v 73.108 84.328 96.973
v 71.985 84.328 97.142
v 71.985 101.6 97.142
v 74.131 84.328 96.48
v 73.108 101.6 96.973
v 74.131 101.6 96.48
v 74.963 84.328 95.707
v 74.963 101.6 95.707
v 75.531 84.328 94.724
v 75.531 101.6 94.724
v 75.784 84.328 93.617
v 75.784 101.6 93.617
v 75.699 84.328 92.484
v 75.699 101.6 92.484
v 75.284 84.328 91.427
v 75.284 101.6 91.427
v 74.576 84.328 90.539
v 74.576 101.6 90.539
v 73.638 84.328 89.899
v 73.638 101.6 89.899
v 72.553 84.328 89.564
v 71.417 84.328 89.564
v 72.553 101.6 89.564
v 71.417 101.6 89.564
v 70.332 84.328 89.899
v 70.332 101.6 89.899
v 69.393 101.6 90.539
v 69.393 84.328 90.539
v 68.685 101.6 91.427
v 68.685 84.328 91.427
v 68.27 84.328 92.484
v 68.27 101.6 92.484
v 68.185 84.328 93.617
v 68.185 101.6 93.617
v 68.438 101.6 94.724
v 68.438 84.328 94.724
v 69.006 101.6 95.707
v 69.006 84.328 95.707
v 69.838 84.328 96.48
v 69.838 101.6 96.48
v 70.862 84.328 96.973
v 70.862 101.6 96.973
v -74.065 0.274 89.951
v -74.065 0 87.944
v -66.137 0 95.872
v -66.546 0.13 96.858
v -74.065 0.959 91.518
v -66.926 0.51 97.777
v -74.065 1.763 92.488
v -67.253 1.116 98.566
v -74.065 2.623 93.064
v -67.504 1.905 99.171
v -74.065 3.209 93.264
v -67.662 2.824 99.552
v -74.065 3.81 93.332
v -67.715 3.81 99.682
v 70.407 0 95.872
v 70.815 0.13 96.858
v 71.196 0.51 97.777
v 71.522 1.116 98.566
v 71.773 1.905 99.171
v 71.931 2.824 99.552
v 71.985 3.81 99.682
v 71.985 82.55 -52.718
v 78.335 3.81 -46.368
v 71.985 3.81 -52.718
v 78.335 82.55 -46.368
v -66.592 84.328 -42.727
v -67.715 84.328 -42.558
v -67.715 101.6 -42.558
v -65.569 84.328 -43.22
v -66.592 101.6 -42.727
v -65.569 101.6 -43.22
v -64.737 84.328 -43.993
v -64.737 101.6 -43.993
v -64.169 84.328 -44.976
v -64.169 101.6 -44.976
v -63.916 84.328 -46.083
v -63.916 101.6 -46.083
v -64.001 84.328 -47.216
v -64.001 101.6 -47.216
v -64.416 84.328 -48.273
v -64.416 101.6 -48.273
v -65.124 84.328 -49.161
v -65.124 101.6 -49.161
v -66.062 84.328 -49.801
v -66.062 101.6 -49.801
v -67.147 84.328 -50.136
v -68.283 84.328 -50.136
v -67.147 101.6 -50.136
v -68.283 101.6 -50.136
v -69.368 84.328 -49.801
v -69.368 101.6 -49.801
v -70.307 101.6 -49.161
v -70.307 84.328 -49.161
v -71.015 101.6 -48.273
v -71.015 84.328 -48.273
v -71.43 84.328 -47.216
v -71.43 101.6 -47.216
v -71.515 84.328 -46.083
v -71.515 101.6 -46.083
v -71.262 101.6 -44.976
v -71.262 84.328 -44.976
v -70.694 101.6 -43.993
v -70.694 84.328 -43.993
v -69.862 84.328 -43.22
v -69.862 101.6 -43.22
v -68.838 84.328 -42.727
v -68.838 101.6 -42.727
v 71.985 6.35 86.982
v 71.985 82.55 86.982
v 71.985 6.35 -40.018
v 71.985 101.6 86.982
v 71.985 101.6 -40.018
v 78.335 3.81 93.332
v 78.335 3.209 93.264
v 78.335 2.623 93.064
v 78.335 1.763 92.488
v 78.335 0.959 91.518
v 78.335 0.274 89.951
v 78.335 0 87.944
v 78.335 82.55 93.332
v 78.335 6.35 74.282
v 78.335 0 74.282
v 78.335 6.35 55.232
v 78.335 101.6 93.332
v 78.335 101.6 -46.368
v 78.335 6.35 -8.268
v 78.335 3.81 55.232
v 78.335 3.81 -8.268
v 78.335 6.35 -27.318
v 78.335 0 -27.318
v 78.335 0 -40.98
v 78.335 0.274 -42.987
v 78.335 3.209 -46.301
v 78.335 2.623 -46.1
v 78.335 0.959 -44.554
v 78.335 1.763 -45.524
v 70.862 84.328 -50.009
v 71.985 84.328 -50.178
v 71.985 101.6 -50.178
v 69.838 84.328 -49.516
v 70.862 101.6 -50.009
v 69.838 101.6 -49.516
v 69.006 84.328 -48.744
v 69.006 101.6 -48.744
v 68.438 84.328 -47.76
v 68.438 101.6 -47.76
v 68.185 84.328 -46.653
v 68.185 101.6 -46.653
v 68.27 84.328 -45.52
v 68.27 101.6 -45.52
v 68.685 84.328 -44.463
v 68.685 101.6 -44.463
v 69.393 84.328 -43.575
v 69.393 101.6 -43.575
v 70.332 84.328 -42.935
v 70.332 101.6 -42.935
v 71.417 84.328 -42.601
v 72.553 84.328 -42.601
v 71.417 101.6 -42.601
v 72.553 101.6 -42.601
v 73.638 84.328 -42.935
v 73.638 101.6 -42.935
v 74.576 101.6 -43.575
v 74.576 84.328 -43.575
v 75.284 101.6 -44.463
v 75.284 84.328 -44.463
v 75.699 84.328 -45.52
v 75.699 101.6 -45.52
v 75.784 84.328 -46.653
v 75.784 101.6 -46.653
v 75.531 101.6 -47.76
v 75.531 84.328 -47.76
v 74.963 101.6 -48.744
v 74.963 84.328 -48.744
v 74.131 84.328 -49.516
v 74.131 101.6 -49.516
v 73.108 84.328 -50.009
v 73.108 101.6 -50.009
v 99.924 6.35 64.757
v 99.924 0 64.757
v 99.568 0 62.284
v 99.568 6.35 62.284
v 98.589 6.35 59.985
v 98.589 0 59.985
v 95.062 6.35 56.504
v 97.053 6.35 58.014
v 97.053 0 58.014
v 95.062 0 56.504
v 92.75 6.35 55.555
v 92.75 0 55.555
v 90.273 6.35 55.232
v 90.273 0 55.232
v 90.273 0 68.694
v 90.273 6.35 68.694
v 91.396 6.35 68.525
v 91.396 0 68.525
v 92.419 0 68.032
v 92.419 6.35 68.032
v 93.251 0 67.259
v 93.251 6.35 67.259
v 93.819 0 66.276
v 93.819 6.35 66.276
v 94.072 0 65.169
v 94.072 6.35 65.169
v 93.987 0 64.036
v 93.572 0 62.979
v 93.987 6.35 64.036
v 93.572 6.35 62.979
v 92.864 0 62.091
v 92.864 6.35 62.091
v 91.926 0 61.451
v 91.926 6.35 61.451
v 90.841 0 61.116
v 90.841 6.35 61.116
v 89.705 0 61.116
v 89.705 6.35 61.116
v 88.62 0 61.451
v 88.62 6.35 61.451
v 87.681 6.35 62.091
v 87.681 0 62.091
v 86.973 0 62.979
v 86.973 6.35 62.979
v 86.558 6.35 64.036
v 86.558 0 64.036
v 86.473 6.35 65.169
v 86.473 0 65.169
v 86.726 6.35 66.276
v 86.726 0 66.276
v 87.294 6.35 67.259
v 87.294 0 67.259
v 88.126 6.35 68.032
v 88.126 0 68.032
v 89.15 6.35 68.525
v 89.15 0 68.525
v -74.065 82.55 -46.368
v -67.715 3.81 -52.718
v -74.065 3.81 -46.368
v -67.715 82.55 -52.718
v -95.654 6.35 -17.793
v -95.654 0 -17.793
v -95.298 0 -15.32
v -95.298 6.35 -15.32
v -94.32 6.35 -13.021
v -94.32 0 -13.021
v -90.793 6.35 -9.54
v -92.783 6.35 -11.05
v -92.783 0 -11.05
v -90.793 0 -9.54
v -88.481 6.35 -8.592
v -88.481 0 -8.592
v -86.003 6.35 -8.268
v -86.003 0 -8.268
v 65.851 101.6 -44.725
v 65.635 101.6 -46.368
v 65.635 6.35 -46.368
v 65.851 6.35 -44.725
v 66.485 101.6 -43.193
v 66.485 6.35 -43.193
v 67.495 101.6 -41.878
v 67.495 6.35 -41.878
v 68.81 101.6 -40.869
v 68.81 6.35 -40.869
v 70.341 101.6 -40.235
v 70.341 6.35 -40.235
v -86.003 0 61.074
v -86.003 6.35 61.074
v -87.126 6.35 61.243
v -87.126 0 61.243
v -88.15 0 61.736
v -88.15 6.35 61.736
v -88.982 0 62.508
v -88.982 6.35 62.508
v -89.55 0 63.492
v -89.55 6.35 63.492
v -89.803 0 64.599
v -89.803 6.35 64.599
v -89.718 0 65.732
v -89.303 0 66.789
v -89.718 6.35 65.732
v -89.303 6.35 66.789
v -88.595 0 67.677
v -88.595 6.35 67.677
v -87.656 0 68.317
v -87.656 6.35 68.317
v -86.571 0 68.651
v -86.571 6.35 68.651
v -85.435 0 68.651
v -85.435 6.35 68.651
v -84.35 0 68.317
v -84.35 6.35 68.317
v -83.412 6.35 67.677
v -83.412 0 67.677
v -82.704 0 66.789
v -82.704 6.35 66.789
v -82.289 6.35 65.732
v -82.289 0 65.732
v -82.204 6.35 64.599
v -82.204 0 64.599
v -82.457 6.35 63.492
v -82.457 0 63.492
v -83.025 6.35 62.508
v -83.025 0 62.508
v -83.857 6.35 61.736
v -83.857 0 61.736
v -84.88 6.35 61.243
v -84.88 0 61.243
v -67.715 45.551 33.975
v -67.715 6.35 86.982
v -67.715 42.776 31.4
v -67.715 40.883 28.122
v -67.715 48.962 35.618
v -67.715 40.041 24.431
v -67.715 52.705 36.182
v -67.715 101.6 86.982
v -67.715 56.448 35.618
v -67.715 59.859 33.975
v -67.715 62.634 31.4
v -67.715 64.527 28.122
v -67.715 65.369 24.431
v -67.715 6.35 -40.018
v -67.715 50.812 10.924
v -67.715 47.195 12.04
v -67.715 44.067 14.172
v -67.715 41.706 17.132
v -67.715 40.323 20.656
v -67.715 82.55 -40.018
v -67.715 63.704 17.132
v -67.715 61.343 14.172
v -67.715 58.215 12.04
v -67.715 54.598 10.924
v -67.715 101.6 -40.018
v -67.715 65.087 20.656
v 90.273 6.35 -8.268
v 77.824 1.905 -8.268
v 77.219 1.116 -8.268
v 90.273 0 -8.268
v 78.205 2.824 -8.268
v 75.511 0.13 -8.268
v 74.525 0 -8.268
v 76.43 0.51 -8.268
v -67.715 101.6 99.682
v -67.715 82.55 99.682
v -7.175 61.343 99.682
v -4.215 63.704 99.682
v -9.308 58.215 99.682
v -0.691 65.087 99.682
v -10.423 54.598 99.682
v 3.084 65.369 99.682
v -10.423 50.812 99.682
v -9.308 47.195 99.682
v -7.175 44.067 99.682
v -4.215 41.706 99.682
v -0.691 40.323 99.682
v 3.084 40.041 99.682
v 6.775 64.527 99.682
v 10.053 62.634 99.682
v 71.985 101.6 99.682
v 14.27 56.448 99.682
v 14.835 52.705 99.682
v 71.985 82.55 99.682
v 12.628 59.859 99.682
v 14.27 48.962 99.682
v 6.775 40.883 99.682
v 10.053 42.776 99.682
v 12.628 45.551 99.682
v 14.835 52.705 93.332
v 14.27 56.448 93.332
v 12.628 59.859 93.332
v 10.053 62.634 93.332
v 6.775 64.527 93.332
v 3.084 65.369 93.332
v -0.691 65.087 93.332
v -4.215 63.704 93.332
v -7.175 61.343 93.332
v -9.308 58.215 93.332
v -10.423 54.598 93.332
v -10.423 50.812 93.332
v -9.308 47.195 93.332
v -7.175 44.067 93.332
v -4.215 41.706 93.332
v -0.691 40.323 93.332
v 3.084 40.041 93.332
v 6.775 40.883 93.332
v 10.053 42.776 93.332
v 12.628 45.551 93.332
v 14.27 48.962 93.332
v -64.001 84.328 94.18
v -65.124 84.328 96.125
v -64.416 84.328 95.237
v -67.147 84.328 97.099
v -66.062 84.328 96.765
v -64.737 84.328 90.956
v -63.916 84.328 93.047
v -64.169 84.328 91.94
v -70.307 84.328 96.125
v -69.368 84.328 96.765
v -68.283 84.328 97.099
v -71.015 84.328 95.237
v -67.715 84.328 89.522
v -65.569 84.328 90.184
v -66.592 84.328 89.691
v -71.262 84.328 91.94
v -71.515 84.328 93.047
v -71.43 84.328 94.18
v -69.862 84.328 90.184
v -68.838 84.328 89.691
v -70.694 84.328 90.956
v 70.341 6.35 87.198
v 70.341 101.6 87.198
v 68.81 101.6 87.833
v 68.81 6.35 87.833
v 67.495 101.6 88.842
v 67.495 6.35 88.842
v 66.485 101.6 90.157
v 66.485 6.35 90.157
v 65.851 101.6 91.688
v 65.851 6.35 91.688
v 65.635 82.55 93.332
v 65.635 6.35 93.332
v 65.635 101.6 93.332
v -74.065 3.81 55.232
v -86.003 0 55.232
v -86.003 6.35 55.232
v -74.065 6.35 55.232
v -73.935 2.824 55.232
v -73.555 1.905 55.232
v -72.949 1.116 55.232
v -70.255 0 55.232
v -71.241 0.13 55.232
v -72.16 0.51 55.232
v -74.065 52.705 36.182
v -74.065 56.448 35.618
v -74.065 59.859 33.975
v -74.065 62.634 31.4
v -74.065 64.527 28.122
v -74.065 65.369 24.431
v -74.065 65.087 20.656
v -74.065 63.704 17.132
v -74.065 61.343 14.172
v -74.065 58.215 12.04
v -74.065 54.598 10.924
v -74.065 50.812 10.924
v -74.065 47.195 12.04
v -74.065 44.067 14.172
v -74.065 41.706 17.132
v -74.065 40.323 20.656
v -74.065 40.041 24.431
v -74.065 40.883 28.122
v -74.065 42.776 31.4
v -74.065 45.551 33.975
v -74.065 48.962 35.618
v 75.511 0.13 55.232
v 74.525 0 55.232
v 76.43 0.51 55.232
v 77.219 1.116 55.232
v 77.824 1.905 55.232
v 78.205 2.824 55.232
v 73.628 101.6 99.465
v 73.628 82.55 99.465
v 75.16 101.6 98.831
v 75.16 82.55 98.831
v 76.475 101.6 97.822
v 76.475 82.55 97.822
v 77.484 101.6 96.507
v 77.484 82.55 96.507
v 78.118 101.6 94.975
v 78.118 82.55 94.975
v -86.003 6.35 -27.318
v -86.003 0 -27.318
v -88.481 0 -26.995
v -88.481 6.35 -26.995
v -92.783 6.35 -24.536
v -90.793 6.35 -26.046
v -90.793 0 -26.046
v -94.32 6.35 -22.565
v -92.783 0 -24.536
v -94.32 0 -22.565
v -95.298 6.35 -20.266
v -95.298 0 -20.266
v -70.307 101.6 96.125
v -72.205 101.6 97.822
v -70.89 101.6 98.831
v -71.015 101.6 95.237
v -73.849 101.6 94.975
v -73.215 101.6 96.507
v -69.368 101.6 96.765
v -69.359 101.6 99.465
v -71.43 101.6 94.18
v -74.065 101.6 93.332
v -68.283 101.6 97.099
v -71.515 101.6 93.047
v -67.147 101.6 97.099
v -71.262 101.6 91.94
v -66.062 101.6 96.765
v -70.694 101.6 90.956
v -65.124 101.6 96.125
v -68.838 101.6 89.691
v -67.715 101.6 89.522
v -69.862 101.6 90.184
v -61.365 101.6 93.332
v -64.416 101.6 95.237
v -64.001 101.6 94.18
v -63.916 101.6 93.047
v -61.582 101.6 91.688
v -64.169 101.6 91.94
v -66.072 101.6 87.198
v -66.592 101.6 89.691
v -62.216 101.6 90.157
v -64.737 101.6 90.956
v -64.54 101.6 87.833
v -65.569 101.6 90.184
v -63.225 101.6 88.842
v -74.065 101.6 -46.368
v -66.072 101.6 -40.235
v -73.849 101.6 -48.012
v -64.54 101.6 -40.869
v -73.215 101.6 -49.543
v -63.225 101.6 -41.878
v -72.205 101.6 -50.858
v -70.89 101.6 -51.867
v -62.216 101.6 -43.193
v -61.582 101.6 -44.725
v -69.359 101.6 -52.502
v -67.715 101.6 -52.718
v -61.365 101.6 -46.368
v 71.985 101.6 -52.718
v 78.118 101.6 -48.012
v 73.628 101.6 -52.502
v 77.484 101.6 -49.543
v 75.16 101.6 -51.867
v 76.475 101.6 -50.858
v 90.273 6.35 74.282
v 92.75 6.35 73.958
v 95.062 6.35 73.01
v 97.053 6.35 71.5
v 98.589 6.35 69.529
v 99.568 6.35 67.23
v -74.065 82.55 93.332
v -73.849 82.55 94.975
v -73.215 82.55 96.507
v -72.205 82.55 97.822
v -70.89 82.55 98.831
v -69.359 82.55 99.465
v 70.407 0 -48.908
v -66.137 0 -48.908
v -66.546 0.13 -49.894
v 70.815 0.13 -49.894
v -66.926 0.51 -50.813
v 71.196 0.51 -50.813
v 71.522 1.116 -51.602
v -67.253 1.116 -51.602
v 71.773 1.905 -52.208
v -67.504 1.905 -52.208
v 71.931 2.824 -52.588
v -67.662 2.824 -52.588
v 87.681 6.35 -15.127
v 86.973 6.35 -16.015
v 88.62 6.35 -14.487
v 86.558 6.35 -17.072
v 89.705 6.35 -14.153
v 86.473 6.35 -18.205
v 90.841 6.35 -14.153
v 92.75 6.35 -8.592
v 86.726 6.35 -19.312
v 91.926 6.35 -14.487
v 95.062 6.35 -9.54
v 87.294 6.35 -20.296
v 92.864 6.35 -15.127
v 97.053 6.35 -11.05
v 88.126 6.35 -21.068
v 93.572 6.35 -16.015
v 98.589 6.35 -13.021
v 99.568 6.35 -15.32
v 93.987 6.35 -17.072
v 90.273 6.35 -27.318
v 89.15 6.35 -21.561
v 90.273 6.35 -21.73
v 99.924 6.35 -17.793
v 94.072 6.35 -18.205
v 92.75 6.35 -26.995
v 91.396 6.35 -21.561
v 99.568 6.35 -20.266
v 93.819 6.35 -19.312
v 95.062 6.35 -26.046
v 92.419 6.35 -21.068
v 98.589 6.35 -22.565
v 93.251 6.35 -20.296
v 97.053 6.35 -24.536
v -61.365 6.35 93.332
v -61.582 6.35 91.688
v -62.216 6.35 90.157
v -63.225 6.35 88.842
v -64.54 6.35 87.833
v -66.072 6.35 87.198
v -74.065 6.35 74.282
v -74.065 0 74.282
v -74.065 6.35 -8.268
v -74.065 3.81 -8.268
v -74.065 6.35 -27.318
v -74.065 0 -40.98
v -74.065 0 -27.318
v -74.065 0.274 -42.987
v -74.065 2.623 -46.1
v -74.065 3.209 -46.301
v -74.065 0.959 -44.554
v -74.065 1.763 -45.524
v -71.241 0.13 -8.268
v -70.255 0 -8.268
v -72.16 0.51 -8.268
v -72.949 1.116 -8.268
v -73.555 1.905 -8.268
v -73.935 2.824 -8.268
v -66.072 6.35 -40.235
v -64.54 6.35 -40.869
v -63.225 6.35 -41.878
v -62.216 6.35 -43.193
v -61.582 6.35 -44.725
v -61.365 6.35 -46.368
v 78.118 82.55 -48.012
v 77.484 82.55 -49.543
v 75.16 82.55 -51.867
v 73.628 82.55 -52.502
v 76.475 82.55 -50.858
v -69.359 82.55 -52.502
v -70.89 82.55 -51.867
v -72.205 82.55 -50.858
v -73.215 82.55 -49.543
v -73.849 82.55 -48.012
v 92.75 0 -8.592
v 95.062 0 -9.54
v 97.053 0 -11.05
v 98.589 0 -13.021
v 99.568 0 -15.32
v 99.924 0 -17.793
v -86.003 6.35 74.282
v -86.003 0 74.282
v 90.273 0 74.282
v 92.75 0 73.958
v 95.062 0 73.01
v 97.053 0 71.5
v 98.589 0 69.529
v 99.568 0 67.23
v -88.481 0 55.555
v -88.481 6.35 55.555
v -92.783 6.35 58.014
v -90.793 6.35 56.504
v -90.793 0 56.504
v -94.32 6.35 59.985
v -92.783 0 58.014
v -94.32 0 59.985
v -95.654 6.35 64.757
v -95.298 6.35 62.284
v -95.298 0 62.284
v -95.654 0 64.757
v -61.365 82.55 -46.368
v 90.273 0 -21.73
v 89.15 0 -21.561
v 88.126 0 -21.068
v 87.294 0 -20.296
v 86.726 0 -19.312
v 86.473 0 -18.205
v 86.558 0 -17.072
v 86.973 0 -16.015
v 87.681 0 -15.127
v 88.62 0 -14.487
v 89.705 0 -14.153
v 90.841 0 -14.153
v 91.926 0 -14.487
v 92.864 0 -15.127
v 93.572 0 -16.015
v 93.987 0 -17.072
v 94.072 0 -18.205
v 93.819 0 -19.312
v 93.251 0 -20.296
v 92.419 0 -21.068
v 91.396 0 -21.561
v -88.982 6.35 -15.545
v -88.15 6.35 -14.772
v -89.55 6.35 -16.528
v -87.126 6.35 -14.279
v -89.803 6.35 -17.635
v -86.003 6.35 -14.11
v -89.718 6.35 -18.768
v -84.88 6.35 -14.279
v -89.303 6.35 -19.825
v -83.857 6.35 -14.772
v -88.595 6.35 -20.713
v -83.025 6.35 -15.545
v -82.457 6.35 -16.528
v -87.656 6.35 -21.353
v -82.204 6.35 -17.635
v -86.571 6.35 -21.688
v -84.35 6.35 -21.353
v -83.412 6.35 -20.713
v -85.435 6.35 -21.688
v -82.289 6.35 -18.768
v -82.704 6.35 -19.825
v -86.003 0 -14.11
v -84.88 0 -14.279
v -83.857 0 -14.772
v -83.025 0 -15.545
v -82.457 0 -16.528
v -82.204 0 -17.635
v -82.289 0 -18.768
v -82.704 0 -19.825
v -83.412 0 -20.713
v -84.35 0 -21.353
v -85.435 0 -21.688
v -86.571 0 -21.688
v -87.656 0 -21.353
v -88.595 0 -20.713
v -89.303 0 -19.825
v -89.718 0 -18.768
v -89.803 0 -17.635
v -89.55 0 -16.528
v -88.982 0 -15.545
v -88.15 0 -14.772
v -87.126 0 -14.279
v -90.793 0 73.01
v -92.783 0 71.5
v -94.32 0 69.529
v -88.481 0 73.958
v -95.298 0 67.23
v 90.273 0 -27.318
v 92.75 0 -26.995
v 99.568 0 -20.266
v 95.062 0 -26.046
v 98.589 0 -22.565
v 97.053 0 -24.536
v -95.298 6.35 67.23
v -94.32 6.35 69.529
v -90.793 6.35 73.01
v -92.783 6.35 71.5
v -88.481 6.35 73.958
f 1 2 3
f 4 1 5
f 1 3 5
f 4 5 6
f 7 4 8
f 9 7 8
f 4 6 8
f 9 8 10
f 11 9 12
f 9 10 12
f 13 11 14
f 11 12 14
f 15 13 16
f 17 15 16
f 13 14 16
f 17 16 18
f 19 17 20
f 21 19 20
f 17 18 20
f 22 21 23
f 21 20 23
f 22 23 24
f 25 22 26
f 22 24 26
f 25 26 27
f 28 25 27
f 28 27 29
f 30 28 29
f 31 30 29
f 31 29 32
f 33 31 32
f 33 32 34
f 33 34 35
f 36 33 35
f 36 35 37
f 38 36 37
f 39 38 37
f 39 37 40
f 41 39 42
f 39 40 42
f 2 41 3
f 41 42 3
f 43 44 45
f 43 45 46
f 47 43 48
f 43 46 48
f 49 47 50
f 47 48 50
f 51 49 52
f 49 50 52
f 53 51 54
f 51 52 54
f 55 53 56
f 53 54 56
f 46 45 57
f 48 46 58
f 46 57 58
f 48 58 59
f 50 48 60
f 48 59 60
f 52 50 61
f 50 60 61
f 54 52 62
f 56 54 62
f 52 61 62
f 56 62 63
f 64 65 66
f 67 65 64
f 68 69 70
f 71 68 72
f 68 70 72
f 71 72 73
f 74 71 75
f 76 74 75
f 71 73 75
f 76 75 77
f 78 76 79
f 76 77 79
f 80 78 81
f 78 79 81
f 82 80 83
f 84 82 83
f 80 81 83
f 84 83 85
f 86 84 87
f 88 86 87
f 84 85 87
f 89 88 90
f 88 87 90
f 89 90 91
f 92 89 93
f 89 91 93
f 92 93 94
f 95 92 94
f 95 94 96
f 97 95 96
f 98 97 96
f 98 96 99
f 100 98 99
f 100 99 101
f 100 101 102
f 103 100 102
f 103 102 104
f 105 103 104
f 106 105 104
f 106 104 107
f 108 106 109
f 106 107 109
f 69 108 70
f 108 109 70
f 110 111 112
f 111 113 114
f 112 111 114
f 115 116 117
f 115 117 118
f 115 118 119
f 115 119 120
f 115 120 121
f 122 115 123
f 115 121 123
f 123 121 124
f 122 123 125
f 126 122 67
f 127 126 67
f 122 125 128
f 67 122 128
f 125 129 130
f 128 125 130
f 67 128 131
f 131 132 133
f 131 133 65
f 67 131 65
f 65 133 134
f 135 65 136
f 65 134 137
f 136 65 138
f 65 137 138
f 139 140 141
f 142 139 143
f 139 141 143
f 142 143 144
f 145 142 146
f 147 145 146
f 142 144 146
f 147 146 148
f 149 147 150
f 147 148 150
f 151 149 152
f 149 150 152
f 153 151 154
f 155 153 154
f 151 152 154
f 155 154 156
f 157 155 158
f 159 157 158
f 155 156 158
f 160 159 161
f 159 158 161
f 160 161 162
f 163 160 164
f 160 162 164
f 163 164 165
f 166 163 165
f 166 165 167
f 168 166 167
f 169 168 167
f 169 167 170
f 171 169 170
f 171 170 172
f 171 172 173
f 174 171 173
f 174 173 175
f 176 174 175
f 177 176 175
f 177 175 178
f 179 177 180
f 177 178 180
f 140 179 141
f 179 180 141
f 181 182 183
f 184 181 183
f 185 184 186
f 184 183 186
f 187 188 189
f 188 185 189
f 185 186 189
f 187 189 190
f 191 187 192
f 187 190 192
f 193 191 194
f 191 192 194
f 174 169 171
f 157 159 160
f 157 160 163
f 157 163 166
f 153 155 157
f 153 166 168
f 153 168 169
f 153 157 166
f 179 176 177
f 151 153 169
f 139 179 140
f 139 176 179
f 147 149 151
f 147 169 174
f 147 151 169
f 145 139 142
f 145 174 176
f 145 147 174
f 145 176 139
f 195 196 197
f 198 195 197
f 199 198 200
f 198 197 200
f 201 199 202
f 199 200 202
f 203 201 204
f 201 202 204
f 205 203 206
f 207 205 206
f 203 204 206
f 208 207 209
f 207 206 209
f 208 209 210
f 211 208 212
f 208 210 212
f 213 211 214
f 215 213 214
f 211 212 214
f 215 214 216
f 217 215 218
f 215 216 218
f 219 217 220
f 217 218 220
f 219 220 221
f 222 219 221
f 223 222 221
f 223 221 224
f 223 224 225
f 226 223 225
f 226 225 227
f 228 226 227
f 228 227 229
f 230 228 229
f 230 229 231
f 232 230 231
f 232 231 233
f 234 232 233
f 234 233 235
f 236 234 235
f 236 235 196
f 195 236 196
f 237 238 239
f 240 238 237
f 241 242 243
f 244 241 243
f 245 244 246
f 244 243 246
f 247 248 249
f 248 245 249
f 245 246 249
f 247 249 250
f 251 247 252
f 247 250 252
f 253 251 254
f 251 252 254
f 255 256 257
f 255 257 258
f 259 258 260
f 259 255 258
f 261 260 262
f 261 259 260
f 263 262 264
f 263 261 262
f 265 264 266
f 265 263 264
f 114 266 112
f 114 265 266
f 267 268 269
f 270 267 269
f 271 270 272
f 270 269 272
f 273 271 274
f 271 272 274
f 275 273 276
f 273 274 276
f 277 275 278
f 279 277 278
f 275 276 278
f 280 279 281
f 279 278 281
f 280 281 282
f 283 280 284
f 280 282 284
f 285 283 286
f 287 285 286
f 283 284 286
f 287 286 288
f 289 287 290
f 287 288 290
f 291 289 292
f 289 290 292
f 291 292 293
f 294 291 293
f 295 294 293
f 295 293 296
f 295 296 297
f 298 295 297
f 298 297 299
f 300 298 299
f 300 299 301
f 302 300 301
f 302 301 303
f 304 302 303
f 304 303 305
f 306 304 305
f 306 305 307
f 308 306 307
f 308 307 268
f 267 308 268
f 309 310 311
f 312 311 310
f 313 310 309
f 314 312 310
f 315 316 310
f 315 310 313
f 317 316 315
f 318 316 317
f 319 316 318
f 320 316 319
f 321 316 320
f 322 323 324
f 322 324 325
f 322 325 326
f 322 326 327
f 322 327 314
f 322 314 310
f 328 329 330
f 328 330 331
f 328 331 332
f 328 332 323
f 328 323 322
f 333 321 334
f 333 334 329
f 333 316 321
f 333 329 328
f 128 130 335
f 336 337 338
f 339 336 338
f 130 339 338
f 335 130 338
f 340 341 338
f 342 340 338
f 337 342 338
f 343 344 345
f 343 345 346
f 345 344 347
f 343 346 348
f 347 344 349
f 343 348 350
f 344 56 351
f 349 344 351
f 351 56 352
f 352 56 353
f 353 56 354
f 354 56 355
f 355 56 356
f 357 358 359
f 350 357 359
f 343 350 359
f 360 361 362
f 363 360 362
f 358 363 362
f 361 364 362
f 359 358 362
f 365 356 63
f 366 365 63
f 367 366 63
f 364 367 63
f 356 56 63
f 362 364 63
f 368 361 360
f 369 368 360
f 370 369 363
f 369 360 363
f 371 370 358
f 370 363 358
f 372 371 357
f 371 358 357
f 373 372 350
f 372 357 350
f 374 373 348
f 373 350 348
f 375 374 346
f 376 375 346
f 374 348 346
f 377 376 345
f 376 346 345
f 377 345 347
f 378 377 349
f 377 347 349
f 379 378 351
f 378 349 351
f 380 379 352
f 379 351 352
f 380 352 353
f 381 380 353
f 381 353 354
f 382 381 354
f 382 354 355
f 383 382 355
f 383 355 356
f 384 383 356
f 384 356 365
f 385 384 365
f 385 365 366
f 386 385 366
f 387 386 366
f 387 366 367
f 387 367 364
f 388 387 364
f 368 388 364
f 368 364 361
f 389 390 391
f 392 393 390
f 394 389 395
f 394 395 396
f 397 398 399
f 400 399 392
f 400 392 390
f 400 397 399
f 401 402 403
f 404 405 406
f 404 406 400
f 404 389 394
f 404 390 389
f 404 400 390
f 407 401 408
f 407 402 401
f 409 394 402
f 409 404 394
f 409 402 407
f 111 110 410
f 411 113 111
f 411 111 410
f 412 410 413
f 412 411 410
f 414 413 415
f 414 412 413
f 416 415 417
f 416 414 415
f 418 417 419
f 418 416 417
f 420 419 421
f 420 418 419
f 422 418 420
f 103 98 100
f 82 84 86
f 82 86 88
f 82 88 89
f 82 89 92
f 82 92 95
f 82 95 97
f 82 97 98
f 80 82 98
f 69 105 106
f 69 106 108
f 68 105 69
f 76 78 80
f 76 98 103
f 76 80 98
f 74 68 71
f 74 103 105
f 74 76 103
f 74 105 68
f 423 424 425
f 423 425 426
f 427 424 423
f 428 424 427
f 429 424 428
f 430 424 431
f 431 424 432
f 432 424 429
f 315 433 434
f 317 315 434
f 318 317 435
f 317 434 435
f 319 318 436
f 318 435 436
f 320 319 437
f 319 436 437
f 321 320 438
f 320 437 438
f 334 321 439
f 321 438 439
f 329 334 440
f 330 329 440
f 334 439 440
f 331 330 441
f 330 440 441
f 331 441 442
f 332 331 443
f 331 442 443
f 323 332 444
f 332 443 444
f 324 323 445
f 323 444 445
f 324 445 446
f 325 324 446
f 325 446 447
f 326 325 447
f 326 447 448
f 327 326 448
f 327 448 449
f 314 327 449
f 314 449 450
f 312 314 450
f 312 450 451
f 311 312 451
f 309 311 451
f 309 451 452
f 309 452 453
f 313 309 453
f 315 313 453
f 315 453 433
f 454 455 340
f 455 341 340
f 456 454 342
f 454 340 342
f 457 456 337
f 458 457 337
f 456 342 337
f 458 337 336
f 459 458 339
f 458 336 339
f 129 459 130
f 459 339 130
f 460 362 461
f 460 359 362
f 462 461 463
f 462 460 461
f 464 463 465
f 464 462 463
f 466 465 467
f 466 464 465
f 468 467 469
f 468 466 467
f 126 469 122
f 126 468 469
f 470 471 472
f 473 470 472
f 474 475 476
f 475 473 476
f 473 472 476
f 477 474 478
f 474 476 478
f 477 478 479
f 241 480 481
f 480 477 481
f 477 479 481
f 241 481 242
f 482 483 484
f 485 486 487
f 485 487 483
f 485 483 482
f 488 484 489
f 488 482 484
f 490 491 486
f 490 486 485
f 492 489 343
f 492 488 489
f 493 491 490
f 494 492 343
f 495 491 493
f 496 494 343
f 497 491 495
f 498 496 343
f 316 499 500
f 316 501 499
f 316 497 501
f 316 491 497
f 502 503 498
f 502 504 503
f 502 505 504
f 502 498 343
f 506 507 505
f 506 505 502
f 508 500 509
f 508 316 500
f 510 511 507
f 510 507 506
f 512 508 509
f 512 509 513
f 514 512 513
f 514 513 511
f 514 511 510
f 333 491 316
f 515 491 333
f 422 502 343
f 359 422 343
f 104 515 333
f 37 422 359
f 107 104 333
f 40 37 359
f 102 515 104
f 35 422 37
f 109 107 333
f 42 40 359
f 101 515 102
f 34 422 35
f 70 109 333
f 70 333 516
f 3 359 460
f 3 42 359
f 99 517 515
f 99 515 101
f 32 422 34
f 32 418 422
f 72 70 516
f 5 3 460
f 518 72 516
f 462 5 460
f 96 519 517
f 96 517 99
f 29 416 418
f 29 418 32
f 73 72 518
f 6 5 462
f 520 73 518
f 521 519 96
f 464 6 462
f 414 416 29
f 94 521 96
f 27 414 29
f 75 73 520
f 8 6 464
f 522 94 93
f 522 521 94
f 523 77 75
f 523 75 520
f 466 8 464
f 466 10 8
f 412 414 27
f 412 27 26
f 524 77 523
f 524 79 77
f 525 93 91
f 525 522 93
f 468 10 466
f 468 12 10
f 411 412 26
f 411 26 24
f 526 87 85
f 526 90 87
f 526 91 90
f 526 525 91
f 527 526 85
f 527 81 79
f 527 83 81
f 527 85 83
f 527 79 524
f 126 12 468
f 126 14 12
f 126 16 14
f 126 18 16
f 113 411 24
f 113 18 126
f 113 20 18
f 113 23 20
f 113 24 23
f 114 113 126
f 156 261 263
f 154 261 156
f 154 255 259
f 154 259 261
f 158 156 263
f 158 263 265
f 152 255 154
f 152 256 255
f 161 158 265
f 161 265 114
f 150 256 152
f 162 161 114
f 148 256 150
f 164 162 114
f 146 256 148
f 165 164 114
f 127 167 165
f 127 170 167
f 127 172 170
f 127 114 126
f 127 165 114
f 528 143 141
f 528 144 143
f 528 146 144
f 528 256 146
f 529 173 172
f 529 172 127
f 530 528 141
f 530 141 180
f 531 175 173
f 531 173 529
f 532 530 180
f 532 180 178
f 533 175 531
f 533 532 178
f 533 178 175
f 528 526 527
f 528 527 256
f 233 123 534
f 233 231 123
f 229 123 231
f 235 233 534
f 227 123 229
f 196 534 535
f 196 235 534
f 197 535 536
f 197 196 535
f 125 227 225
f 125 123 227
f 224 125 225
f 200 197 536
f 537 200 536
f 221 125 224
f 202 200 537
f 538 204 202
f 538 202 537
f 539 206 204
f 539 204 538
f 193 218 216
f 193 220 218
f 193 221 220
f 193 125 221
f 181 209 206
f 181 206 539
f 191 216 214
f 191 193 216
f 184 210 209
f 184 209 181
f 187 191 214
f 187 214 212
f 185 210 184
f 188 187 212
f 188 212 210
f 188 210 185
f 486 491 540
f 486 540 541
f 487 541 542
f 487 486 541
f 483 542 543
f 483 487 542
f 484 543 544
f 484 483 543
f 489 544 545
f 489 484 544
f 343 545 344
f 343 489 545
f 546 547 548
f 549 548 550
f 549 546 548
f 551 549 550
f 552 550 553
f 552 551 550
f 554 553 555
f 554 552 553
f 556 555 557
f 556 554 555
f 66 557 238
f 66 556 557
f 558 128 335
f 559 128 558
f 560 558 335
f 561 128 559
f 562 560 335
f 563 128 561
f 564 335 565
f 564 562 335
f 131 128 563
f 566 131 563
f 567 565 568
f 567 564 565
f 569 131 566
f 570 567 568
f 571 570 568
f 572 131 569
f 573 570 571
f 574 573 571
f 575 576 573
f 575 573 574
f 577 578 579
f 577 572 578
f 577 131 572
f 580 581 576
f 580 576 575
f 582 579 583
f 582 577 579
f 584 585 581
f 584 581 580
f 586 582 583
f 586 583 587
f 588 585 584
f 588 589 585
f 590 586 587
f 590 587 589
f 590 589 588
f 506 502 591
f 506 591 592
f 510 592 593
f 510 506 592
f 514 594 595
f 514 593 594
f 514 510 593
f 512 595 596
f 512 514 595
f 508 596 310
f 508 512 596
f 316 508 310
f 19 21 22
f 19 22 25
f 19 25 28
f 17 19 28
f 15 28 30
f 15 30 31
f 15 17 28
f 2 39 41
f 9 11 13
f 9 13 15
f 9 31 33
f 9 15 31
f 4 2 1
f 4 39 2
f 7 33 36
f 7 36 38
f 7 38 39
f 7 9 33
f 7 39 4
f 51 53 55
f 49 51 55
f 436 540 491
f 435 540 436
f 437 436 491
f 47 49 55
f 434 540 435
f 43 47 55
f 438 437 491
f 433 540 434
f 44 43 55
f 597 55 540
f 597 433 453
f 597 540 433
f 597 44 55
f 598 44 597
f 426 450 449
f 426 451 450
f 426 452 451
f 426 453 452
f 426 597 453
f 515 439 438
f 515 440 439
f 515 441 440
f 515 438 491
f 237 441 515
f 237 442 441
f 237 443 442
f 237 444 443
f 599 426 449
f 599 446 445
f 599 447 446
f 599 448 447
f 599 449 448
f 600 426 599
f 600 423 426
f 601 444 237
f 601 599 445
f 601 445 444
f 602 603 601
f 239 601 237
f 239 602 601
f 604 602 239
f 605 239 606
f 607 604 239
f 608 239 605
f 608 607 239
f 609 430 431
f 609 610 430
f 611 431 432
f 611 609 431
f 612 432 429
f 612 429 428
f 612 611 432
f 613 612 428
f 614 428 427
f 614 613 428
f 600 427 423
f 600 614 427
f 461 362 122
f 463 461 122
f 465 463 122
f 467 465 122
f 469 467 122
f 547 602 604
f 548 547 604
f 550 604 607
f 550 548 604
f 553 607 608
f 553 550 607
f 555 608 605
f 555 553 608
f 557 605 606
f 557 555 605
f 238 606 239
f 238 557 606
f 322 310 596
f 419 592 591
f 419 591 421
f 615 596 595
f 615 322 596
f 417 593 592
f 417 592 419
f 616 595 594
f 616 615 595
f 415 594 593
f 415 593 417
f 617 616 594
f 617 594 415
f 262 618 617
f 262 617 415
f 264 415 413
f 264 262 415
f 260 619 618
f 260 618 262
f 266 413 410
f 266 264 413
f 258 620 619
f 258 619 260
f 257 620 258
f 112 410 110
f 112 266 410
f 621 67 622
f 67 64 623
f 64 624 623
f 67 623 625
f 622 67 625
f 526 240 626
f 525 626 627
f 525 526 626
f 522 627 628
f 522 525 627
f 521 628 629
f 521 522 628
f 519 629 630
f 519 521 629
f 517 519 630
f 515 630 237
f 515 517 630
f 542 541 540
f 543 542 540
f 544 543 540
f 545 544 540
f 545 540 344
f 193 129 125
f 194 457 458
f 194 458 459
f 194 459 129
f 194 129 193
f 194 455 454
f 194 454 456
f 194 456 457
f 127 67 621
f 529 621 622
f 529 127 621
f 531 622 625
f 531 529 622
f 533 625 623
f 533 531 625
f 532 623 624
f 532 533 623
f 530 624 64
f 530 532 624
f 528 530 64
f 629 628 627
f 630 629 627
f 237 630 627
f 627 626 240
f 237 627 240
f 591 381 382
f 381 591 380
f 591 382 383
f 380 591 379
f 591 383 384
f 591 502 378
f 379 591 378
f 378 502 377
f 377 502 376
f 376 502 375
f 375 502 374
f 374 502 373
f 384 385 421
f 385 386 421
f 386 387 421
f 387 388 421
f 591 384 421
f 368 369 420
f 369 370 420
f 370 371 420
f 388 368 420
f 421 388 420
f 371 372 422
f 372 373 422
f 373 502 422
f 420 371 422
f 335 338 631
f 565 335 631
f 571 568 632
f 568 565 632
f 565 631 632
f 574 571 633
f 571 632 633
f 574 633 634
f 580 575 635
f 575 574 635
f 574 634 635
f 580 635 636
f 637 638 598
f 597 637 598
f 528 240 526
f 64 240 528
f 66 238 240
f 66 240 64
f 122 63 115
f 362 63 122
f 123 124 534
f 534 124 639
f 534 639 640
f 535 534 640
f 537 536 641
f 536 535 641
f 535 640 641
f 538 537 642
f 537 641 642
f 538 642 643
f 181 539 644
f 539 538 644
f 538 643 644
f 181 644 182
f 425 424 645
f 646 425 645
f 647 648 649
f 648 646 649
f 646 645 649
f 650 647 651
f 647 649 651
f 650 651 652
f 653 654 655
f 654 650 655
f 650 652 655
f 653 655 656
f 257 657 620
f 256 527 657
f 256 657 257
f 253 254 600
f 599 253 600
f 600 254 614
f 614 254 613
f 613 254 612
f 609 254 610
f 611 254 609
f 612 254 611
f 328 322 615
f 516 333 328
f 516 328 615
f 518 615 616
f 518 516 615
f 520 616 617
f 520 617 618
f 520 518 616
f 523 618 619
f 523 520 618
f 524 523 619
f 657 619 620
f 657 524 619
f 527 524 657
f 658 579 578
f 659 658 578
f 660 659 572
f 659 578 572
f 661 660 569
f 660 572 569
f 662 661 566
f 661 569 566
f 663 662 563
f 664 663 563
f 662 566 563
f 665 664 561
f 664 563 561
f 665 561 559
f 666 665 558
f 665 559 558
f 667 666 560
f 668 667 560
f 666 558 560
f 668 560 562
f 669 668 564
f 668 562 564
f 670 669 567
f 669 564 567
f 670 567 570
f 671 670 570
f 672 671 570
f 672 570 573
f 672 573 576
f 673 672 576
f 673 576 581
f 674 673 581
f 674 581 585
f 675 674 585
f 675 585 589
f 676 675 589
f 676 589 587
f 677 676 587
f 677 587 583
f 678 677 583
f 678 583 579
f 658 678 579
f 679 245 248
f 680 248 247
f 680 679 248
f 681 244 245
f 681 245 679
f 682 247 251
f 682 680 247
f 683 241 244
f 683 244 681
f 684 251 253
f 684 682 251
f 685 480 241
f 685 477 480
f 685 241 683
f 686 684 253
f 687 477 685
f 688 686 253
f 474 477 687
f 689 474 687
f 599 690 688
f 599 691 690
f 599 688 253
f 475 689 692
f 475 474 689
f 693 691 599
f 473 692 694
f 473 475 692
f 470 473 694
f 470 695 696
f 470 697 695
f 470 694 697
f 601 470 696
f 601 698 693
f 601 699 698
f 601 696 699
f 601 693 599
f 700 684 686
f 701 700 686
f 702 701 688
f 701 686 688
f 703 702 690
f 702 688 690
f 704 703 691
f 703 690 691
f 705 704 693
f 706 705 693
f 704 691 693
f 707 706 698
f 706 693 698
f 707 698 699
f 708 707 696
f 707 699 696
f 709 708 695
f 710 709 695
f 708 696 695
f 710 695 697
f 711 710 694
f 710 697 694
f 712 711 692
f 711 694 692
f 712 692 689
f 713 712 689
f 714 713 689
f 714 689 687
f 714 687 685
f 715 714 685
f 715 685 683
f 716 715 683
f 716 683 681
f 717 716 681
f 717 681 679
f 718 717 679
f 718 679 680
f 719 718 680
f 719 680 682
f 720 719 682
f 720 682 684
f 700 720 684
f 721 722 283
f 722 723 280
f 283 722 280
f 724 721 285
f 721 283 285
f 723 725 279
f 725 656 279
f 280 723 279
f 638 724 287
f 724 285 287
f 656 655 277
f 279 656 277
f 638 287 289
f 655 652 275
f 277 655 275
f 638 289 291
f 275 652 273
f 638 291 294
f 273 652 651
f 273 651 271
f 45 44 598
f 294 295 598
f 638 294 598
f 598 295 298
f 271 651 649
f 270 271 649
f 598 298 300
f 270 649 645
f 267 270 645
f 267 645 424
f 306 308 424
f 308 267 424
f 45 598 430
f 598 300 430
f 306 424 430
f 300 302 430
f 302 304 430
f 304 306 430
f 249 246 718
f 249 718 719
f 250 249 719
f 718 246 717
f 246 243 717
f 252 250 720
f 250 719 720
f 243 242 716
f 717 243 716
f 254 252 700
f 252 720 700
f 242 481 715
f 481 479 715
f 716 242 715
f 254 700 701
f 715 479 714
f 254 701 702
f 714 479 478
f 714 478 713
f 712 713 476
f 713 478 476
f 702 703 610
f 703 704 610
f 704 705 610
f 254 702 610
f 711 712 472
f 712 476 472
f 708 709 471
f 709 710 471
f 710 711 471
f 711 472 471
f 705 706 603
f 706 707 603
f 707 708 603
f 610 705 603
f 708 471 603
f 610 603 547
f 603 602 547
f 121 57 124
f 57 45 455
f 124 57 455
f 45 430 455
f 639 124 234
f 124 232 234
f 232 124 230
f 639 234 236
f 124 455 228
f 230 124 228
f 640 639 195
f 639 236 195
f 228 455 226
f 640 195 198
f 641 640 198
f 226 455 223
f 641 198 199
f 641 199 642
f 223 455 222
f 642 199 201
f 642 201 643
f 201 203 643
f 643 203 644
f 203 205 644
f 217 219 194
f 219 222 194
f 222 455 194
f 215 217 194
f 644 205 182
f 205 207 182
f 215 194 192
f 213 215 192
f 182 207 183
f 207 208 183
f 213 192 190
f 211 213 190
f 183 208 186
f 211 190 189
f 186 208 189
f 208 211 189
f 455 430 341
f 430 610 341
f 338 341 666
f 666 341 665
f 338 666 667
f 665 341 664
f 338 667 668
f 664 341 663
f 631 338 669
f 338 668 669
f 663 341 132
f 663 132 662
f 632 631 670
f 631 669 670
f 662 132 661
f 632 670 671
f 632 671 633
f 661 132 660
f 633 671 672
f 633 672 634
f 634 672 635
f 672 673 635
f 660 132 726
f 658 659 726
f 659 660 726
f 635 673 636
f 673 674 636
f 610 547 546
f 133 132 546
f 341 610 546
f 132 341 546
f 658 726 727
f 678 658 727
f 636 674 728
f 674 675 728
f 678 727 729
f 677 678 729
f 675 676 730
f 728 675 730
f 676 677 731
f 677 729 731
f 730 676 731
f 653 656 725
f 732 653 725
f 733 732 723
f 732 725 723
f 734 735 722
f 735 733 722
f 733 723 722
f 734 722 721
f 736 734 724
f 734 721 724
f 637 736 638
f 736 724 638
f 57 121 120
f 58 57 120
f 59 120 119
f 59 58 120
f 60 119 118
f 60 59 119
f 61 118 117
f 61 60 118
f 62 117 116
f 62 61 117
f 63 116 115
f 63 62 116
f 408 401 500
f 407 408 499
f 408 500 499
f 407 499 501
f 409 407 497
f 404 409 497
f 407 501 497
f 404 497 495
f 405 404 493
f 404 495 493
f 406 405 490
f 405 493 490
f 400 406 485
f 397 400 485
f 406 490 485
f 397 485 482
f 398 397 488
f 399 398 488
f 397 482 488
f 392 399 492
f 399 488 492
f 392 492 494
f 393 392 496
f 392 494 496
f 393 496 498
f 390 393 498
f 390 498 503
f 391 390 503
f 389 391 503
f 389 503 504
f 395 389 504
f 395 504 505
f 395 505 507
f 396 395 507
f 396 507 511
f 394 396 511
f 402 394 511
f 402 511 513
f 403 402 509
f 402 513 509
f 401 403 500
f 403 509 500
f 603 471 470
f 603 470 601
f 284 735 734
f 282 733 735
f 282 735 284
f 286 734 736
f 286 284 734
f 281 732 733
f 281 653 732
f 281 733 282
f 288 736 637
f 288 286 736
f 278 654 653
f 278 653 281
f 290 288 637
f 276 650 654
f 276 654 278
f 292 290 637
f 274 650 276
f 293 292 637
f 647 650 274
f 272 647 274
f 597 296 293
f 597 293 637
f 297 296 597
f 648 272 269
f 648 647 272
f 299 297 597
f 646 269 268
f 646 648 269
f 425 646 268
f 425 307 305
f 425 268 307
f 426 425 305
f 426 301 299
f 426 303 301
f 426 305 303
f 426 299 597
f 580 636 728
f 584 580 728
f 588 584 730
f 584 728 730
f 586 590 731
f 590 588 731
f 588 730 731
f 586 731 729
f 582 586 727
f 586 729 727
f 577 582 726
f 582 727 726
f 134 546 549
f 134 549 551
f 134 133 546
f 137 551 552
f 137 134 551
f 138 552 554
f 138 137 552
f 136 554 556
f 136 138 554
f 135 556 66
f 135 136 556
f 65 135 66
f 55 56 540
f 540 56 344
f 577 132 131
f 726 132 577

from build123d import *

# Parameters (mm, degrees)
SKETCH1_W           = 152.4
SKETCH1_H           = 152.4
BOSS_EXTRUDE1_DEPTH = 101.6
SKETCH2_W           = 25.4
SKETCH2_H           = 19.05
BOSS_EXTRUDE2_DEPTH = 6.35
SKETCH3_W           = 139.7
SKETCH3_H           = 139.7
CUT_EXTRUDE1_DEPTH  = 95.25
FILLET1_R           = 9.652
CHAMFER1_SIZE       = 6.35
SKETCH4_R           = 3.81
CUT_EXTRUDE2_DEPTH  = 171.275704178
FILLET2_R           = 3.81
SKETCH5_R           = 6.35
BOSS_EXTRUDE3_DEPTH = 19.05
BOSS_EXTRUDE4_DEPTH = 95.25
SKETCH6_R           = 3.81
CUT_EXTRUDE3_DEPTH  = 17.272
CUT_EXTRUDE4_REACH  = 210.646
SKETCH8_R           = 12.7
CUT_EXTRUDE5_REACH  = 226.792
SKETCH9_R           = 12.7


with BuildPart() as part:
    # Sketch1 → Boss-Extrude1 (new body)
    with BuildSketch(Plane(origin=(0, 0, 0), x_dir=(1, 0, 0), z_dir=(0, 1, 0))):
        with Locations((2.134713764, -23.481851401)):
            Rectangle(SKETCH1_W, SKETCH1_H)
    extrude(amount=BOSS_EXTRUDE1_DEPTH)

    # Sketch2 → Boss-Extrude2 (add)
    with BuildSketch(Plane(origin=(0, 0, 0), x_dir=(1, 0, 0), z_dir=(0, 1, 0))):
        with Locations((87.224713764, -64.756851401)):
            Rectangle(SKETCH2_W, SKETCH2_H)
        with Locations((-82.955286236, -64.756851401)):
            Rectangle(SKETCH2_W, SKETCH2_H)
        with Locations((87.224713764, 17.793148599)):
            Rectangle(SKETCH2_W, SKETCH2_H)
        with Locations((-82.955286236, 17.793148599)):
            Rectangle(SKETCH2_W, SKETCH2_H)
    extrude(amount=BOSS_EXTRUDE2_DEPTH)

    # Sketch3 → Cut-Extrude1 (cut)
    with BuildSketch(Plane(origin=(0, 101.6, 0), x_dir=(1, 0, 0), z_dir=(0, 1, 0))):
        with Locations((2.134713764, -23.481851401)):
            Rectangle(SKETCH3_W, SKETCH3_H)
    extrude(amount=-CUT_EXTRUDE1_DEPTH, mode=Mode.SUBTRACT)

    # Fillet1
    # the kernel refuses this fillet: 9.652 mm, written as the material it takes off along each edge
    with BuildSketch(Plane(origin=(-95.655286236, -24.13, -27.318148599), x_dir=(1, 0, 0), z_dir=(0, 1, 0)), Plane(origin=(-95.655286236, -24.13, 55.231851401), x_dir=(1, 0, 0), z_dir=(0, 1, 0)), Plane(origin=(99.924713764, -24.13, -8.268148599), x_dir=(-1, 0, 0), z_dir=(0, 1, 0)), Plane(origin=(99.924713764, -24.13, 74.281851401), x_dir=(-1, 0, 0), z_dir=(0, 1, 0))) as fillet1_piece_1:
        with BuildLine():
            CenterArc((FILLET1_R, -FILLET1_R), FILLET1_R, 90, 90)
            Line((0, -FILLET1_R), (0, 0))
            Line((0, 0), (FILLET1_R, 0))
        make_face()
    extrude(amount=54.61, mode=Mode.SUBTRACT)
    with BuildSketch(Plane(origin=(-95.655286236, -24.13, -8.268148599), x_dir=(1, 0, 0), z_dir=(0, 1, 0)), Plane(origin=(-95.655286236, -24.13, 74.281851401), x_dir=(1, 0, 0), z_dir=(0, 1, 0)), Plane(origin=(99.924713764, -24.13, -27.318148599), x_dir=(-1, 0, 0), z_dir=(0, 1, 0)), Plane(origin=(99.924713764, -24.13, 55.231851401), x_dir=(-1, 0, 0), z_dir=(0, 1, 0))) as fillet1_piece_2:
        with BuildLine():
            CenterArc((FILLET1_R, FILLET1_R), FILLET1_R, 180, 90)
            Line((0, FILLET1_R), (0, 0))
            Line((0, 0), (FILLET1_R, 0))
        make_face()
    extrude(amount=54.61, mode=Mode.SUBTRACT)

    # Chamfer1
    chamfer1_edges = [part.edges().sort_by_distance(p)[0] for p in [
        (-74.065286236, 50.8, -52.718148599),
        (78.334713764, 50.8, -52.718148599),
        (78.334713764, 50.8, 99.681851401),
        (-74.065286236, 50.8, 99.681851401),
    ]]
    chamfer(chamfer1_edges, length=CHAMFER1_SIZE)

    # Sketch4 → Cut-Extrude2 (cut, through all)
    with BuildSketch(Plane(origin=(0, 6.35, 0), x_dir=(1, 0, 0), z_dir=(0, 1, 0))):
        with Locations(Location((90.272713764, -64.883851401, 0), (0, 0, 270))):
            Circle(SKETCH4_R)
        with Locations(Location((-86.003286236, -64.883851401, 0), (0, 0, 90))):
            Circle(SKETCH4_R)
        with Locations(Location((90.272713764, 17.920148599, 0), (0, 0, 90))):
            Circle(SKETCH4_R)
        with Locations(Location((-86.003286236, 17.920148599, 0), (0, 0, 270))):
            Circle(SKETCH4_R)
    extrude(amount=-CUT_EXTRUDE2_DEPTH, mode=Mode.SUBTRACT)

    # Fillet2
    fillet2_edges = [part.edges().sort_by_distance(p)[0] for p in [
        (-70.890286236, 0, 96.506851401),
        (-74.065286236, 0, 23.481851401),
        (-70.890286236, 0, -49.543148599),
        (2.134713764, 0, -52.718148599),
        (75.159713764, 0, -49.543148599),
        (78.334713764, 0, 23.481851401),
        (75.159713764, 0, 96.506851401),
        (2.134713764, 0, 99.681851401),
    ]]
    fillet(fillet2_edges, radius=FILLET2_R)

    # Sketch5 → Boss-Extrude3 (add)
    with BuildSketch(Plane(origin=(0, 101.6, 0), x_dir=(1, 0, 0), z_dir=(0, 1, 0))):
        with Locations((71.984713764, -93.331851401)):
            Circle(SKETCH5_R)
        with Locations((-67.715286236, -93.331851401)):
            Circle(SKETCH5_R)
        with Locations((-67.715286236, 46.368148599)):
            Circle(SKETCH5_R)
        with Locations((71.984713764, 46.368148599)):
            Circle(SKETCH5_R)
    extrude(amount=-BOSS_EXTRUDE3_DEPTH)

    # Sketch7 → Boss-Extrude4 (add)
    with BuildSketch(Plane(origin=(0, 101.6, 0), x_dir=(1, 0, 0), z_dir=(0, 1, 0))):
        with BuildLine():
            Line((71.984713764, -99.681851401), (78.334713764, -93.331851401))
            ThreePointArc((78.334713764, -93.331851401), (67.494585703, -88.84172334), (71.984713764, -99.681851401))
        make_face()
        with BuildLine():
            Line((-67.715286236, -99.681851401), (-74.065286236, -93.331851401))
            ThreePointArc((-74.065286236, -93.331851401), (-63.225158176, -88.84172334), (-67.715286236, -99.681851401))
        make_face()
        with BuildLine():
            Line((71.984713764, 52.718148599), (78.334713764, 46.368148599))
            ThreePointArc((78.334713764, 46.368148599), (67.494585703, 41.878020539), (71.984713764, 52.718148599))
        make_face()
        with BuildLine():
            Line((-67.715286236, 52.718148599), (-74.065286236, 46.368148599))
            ThreePointArc((-74.065286236, 46.368148599), (-63.225158176, 41.878020539), (-67.715286236, 52.718148599))
        make_face()
    extrude(amount=-BOSS_EXTRUDE4_DEPTH)

    # Sketch6 → Cut-Extrude3 (cut)
    with BuildSketch(Plane(origin=(0, 101.6, 0), x_dir=(1, 0, 0), z_dir=(0, 1, 0))):
        with Locations(Location((71.984713764, -93.331851401, 0), (0, 0, 270))):
            Circle(SKETCH6_R)
        with Locations(Location((-67.715286236, -93.331851401, 0), (0, 0, 90))):
            Circle(SKETCH6_R)
        with Locations(Location((71.984713764, 46.368148599, 0), (0, 0, 90))):
            Circle(SKETCH6_R)
        with Locations(Location((-67.715286236, 46.368148599, 0), (0, 0, 270))):
            Circle(SKETCH6_R)
    extrude(amount=-CUT_EXTRUDE3_DEPTH, mode=Mode.SUBTRACT)

    # Sketch8 → Cut-Extrude4 (cut, up to next)
    with BuildSketch(Plane.XY.offset(99.681851401), mode=Mode.PRIVATE) as cut_extrude4_sk1:
        with Locations((2.134713764, 52.705)):
            Circle(SKETCH8_R)
    cut_extrude4_tool1 = extrude(cut_extrude4_sk1.sketch, amount=-CUT_EXTRUDE4_REACH, mode=Mode.PRIVATE) & part.part
    add(cut_extrude4_tool1.solids().sort_by_distance((2.134714, 52.705, 99.681851))[0], mode=Mode.SUBTRACT)

    # Sketch9 → Cut-Extrude5 (cut, up to next)
    with BuildSketch(Plane.ZY.offset(74.065286236), mode=Mode.PRIVATE) as cut_extrude5_sk1:
        with Locations((23.481851401, 52.705)):
            Circle(SKETCH9_R)
    cut_extrude5_tool1 = extrude(cut_extrude5_sk1.sketch, amount=-CUT_EXTRUDE5_REACH, mode=Mode.PRIVATE) & part.part
    add(cut_extrude5_tool1.solids().sort_by_distance((-74.065286, 52.705, 23.481851))[0], mode=Mode.SUBTRACT)


solid = part.part
